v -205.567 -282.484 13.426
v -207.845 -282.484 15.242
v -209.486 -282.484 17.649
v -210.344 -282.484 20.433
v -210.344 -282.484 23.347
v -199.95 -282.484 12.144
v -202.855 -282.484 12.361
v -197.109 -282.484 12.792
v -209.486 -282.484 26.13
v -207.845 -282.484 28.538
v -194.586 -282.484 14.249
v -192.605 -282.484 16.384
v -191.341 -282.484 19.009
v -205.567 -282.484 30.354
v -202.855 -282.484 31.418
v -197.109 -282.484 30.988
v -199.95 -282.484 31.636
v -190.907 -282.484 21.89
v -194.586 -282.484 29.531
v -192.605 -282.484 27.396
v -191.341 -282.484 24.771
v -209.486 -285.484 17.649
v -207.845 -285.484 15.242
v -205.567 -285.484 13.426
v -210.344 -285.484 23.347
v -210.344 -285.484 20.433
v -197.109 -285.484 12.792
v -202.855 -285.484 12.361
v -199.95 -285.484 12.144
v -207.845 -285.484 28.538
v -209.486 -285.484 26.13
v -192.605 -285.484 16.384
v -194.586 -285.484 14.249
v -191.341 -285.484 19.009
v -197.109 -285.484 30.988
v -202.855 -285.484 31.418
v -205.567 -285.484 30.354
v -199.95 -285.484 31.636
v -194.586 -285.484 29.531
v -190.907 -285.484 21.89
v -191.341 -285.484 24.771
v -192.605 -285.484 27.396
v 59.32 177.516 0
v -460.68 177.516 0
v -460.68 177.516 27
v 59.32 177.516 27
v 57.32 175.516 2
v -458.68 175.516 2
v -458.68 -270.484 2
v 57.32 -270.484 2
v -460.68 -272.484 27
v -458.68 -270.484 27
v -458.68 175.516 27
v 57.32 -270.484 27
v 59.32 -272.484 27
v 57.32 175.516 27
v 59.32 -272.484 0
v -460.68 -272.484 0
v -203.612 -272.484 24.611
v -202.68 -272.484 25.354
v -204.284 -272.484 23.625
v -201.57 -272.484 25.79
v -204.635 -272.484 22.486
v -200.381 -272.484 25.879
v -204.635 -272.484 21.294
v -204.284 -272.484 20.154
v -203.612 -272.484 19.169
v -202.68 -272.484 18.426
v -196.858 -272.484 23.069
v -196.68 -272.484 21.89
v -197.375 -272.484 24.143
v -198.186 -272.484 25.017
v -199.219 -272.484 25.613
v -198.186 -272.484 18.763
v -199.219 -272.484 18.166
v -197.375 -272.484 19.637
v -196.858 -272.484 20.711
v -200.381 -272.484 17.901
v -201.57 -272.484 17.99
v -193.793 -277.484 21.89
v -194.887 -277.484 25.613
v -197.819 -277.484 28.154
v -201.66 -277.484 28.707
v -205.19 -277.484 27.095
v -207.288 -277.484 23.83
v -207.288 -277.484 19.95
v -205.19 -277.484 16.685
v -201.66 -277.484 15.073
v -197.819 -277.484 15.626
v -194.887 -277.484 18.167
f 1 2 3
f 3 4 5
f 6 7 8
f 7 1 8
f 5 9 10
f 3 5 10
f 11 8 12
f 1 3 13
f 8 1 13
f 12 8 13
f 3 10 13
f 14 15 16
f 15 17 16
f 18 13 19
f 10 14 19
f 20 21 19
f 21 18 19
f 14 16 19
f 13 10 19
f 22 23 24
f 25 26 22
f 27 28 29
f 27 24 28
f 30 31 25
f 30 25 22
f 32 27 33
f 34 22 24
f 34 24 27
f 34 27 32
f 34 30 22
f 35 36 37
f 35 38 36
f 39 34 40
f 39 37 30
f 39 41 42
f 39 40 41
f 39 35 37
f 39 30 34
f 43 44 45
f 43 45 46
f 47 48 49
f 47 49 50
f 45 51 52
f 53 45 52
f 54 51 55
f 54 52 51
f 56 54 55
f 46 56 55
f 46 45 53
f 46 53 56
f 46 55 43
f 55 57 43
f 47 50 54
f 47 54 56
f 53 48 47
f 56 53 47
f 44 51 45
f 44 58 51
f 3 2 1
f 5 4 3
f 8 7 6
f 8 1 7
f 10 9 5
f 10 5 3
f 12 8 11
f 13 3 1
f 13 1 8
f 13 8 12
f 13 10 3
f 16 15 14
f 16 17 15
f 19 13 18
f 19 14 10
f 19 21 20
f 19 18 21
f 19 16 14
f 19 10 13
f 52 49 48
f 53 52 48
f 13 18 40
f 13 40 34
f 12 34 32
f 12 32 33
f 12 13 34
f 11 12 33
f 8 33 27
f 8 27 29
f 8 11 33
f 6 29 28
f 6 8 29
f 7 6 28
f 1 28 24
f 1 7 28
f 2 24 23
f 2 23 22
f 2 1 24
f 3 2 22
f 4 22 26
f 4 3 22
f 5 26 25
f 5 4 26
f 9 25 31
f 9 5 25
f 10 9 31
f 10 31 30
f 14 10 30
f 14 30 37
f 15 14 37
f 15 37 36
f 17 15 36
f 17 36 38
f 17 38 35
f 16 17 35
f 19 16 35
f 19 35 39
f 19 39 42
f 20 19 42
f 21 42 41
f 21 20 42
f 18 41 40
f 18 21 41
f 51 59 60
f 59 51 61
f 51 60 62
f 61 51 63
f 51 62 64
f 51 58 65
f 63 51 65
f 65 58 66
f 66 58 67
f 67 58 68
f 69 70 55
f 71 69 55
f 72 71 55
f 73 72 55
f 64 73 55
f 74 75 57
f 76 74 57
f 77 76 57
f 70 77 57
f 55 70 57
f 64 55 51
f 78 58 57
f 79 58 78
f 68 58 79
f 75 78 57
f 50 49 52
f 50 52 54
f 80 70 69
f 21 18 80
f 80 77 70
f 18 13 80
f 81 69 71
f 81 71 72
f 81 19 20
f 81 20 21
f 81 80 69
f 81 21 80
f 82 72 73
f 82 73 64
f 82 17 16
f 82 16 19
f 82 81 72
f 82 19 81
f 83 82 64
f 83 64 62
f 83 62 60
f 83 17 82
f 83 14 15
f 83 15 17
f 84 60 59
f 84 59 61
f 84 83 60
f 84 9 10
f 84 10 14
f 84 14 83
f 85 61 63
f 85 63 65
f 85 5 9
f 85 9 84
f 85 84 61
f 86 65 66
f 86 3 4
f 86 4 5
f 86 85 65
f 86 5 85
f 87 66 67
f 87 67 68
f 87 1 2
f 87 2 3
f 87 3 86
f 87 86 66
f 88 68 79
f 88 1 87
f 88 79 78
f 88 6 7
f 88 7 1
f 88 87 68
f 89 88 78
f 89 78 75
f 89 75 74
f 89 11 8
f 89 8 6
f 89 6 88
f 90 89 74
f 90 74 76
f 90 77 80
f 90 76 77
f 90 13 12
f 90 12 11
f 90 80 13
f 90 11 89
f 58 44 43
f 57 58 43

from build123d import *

# Parameters (mm, degrees)
F0_W     = 520
F0_H     = 450
F1_DEPTH = 2
F2_W     = 520
F2_H     = 450
F2_W_2   = 516
F2_H_2   = 446
F3_DEPTH = 25
F4_R     = 4
F5_DEPTH = 10
F5_TAPER = -30
F6_DEPTH = 3


with BuildPart() as f1:
    # F0 (on Top) → F1 (new body)
    with BuildSketch(Plane.XY):
        with Locations((-200.6801323552, -47.4835533649)):
            Rectangle(F0_W, F0_H)
    extrude(amount=F1_DEPTH)

    # F2 (on face) → F3 (join)
    with BuildSketch(Plane.XY.offset(2)):
        with Locations((-200.6801323552, -47.4835533649)):
            Rectangle(F2_W, F2_H)
        with Locations((-200.6801323552, -47.4835533649)):
            Rectangle(F2_W_2, F2_H_2, mode=Mode.SUBTRACT)
    extrude(amount=F3_DEPTH)

    # F4 (on face) → F5 (join)
    with BuildSketch(Plane.XZ.offset(272.4835533649)):
        with Locations((-200.6801323552, 21.8899310641)):
            Circle(F4_R)
    extrude(amount=F5_DEPTH, taper=F5_TAPER)


with BuildPart() as f6:
    # F6 (new): a face of the model
    f6_faces = [f1.part.faces().sort_by_distance(p)[0] for p in [
        (-200.6801323552, -282.4835533649, 21.8899310641),
    ]]
    extrude(f6_faces, amount=F6_DEPTH)


solid = Compound([f1.part, f6.part])
